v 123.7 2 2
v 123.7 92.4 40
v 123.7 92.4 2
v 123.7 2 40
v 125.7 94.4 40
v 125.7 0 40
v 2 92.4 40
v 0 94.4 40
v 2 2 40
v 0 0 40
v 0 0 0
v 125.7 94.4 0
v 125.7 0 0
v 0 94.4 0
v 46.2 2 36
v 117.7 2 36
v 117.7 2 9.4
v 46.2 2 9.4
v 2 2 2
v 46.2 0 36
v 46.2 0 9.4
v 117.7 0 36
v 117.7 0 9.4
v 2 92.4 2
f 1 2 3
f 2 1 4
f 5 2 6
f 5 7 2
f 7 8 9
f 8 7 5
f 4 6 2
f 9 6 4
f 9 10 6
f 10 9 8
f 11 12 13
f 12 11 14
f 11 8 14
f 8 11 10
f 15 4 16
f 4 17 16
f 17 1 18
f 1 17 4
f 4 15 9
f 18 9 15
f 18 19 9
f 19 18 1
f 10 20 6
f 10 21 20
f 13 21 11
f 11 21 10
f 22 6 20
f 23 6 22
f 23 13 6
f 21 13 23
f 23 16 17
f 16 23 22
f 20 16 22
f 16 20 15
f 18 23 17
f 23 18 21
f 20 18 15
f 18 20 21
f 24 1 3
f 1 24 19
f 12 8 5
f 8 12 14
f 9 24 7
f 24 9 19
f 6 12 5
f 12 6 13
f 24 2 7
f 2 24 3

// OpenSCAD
wall = 2;

base_x = 119.7;
base_y = 90.4;
case_x = base_x+2*wall;
case_y = base_y+2*wall;
case_z = 40;

lcd_x = 71.5;
lcd_z = 26.6;

module bread_board_aprx() {
    cube([53.4, 83.2, 9.3]);
}

module arduino_aprx() {
    cube([53.8, 72.1, 10]);
}

module case_bottom() {
  union() {
      // Bread board and arduino display
      % translate([case_x-2*wall-54, 2*wall,2*wall]) bread_board_aprx();
      % translate([2*wall, (case_y - 73)/2, 2*wall]) arduino_aprx();
      // Base
      cube([case_x, case_y, wall]);
      // Side walls
      cube([wall, case_y, case_z]);
      translate([case_x, 0, 0]) cube([wall, case_y, case_z]);
      // Front wall
      difference() {
          #cube([case_x, wall, case_z]);
          translate([case_x - wall*3 - lcd_x, -1, case_z-2*wall-lcd_z])
            cube([lcd_x, 6, lcd_z]);
      }
      
      //back wall
      difference() {
          #translate([0, base_y+wall, 0]) cube([case_x, wall, case_z]);
      }
  }
};

case_bottom();
